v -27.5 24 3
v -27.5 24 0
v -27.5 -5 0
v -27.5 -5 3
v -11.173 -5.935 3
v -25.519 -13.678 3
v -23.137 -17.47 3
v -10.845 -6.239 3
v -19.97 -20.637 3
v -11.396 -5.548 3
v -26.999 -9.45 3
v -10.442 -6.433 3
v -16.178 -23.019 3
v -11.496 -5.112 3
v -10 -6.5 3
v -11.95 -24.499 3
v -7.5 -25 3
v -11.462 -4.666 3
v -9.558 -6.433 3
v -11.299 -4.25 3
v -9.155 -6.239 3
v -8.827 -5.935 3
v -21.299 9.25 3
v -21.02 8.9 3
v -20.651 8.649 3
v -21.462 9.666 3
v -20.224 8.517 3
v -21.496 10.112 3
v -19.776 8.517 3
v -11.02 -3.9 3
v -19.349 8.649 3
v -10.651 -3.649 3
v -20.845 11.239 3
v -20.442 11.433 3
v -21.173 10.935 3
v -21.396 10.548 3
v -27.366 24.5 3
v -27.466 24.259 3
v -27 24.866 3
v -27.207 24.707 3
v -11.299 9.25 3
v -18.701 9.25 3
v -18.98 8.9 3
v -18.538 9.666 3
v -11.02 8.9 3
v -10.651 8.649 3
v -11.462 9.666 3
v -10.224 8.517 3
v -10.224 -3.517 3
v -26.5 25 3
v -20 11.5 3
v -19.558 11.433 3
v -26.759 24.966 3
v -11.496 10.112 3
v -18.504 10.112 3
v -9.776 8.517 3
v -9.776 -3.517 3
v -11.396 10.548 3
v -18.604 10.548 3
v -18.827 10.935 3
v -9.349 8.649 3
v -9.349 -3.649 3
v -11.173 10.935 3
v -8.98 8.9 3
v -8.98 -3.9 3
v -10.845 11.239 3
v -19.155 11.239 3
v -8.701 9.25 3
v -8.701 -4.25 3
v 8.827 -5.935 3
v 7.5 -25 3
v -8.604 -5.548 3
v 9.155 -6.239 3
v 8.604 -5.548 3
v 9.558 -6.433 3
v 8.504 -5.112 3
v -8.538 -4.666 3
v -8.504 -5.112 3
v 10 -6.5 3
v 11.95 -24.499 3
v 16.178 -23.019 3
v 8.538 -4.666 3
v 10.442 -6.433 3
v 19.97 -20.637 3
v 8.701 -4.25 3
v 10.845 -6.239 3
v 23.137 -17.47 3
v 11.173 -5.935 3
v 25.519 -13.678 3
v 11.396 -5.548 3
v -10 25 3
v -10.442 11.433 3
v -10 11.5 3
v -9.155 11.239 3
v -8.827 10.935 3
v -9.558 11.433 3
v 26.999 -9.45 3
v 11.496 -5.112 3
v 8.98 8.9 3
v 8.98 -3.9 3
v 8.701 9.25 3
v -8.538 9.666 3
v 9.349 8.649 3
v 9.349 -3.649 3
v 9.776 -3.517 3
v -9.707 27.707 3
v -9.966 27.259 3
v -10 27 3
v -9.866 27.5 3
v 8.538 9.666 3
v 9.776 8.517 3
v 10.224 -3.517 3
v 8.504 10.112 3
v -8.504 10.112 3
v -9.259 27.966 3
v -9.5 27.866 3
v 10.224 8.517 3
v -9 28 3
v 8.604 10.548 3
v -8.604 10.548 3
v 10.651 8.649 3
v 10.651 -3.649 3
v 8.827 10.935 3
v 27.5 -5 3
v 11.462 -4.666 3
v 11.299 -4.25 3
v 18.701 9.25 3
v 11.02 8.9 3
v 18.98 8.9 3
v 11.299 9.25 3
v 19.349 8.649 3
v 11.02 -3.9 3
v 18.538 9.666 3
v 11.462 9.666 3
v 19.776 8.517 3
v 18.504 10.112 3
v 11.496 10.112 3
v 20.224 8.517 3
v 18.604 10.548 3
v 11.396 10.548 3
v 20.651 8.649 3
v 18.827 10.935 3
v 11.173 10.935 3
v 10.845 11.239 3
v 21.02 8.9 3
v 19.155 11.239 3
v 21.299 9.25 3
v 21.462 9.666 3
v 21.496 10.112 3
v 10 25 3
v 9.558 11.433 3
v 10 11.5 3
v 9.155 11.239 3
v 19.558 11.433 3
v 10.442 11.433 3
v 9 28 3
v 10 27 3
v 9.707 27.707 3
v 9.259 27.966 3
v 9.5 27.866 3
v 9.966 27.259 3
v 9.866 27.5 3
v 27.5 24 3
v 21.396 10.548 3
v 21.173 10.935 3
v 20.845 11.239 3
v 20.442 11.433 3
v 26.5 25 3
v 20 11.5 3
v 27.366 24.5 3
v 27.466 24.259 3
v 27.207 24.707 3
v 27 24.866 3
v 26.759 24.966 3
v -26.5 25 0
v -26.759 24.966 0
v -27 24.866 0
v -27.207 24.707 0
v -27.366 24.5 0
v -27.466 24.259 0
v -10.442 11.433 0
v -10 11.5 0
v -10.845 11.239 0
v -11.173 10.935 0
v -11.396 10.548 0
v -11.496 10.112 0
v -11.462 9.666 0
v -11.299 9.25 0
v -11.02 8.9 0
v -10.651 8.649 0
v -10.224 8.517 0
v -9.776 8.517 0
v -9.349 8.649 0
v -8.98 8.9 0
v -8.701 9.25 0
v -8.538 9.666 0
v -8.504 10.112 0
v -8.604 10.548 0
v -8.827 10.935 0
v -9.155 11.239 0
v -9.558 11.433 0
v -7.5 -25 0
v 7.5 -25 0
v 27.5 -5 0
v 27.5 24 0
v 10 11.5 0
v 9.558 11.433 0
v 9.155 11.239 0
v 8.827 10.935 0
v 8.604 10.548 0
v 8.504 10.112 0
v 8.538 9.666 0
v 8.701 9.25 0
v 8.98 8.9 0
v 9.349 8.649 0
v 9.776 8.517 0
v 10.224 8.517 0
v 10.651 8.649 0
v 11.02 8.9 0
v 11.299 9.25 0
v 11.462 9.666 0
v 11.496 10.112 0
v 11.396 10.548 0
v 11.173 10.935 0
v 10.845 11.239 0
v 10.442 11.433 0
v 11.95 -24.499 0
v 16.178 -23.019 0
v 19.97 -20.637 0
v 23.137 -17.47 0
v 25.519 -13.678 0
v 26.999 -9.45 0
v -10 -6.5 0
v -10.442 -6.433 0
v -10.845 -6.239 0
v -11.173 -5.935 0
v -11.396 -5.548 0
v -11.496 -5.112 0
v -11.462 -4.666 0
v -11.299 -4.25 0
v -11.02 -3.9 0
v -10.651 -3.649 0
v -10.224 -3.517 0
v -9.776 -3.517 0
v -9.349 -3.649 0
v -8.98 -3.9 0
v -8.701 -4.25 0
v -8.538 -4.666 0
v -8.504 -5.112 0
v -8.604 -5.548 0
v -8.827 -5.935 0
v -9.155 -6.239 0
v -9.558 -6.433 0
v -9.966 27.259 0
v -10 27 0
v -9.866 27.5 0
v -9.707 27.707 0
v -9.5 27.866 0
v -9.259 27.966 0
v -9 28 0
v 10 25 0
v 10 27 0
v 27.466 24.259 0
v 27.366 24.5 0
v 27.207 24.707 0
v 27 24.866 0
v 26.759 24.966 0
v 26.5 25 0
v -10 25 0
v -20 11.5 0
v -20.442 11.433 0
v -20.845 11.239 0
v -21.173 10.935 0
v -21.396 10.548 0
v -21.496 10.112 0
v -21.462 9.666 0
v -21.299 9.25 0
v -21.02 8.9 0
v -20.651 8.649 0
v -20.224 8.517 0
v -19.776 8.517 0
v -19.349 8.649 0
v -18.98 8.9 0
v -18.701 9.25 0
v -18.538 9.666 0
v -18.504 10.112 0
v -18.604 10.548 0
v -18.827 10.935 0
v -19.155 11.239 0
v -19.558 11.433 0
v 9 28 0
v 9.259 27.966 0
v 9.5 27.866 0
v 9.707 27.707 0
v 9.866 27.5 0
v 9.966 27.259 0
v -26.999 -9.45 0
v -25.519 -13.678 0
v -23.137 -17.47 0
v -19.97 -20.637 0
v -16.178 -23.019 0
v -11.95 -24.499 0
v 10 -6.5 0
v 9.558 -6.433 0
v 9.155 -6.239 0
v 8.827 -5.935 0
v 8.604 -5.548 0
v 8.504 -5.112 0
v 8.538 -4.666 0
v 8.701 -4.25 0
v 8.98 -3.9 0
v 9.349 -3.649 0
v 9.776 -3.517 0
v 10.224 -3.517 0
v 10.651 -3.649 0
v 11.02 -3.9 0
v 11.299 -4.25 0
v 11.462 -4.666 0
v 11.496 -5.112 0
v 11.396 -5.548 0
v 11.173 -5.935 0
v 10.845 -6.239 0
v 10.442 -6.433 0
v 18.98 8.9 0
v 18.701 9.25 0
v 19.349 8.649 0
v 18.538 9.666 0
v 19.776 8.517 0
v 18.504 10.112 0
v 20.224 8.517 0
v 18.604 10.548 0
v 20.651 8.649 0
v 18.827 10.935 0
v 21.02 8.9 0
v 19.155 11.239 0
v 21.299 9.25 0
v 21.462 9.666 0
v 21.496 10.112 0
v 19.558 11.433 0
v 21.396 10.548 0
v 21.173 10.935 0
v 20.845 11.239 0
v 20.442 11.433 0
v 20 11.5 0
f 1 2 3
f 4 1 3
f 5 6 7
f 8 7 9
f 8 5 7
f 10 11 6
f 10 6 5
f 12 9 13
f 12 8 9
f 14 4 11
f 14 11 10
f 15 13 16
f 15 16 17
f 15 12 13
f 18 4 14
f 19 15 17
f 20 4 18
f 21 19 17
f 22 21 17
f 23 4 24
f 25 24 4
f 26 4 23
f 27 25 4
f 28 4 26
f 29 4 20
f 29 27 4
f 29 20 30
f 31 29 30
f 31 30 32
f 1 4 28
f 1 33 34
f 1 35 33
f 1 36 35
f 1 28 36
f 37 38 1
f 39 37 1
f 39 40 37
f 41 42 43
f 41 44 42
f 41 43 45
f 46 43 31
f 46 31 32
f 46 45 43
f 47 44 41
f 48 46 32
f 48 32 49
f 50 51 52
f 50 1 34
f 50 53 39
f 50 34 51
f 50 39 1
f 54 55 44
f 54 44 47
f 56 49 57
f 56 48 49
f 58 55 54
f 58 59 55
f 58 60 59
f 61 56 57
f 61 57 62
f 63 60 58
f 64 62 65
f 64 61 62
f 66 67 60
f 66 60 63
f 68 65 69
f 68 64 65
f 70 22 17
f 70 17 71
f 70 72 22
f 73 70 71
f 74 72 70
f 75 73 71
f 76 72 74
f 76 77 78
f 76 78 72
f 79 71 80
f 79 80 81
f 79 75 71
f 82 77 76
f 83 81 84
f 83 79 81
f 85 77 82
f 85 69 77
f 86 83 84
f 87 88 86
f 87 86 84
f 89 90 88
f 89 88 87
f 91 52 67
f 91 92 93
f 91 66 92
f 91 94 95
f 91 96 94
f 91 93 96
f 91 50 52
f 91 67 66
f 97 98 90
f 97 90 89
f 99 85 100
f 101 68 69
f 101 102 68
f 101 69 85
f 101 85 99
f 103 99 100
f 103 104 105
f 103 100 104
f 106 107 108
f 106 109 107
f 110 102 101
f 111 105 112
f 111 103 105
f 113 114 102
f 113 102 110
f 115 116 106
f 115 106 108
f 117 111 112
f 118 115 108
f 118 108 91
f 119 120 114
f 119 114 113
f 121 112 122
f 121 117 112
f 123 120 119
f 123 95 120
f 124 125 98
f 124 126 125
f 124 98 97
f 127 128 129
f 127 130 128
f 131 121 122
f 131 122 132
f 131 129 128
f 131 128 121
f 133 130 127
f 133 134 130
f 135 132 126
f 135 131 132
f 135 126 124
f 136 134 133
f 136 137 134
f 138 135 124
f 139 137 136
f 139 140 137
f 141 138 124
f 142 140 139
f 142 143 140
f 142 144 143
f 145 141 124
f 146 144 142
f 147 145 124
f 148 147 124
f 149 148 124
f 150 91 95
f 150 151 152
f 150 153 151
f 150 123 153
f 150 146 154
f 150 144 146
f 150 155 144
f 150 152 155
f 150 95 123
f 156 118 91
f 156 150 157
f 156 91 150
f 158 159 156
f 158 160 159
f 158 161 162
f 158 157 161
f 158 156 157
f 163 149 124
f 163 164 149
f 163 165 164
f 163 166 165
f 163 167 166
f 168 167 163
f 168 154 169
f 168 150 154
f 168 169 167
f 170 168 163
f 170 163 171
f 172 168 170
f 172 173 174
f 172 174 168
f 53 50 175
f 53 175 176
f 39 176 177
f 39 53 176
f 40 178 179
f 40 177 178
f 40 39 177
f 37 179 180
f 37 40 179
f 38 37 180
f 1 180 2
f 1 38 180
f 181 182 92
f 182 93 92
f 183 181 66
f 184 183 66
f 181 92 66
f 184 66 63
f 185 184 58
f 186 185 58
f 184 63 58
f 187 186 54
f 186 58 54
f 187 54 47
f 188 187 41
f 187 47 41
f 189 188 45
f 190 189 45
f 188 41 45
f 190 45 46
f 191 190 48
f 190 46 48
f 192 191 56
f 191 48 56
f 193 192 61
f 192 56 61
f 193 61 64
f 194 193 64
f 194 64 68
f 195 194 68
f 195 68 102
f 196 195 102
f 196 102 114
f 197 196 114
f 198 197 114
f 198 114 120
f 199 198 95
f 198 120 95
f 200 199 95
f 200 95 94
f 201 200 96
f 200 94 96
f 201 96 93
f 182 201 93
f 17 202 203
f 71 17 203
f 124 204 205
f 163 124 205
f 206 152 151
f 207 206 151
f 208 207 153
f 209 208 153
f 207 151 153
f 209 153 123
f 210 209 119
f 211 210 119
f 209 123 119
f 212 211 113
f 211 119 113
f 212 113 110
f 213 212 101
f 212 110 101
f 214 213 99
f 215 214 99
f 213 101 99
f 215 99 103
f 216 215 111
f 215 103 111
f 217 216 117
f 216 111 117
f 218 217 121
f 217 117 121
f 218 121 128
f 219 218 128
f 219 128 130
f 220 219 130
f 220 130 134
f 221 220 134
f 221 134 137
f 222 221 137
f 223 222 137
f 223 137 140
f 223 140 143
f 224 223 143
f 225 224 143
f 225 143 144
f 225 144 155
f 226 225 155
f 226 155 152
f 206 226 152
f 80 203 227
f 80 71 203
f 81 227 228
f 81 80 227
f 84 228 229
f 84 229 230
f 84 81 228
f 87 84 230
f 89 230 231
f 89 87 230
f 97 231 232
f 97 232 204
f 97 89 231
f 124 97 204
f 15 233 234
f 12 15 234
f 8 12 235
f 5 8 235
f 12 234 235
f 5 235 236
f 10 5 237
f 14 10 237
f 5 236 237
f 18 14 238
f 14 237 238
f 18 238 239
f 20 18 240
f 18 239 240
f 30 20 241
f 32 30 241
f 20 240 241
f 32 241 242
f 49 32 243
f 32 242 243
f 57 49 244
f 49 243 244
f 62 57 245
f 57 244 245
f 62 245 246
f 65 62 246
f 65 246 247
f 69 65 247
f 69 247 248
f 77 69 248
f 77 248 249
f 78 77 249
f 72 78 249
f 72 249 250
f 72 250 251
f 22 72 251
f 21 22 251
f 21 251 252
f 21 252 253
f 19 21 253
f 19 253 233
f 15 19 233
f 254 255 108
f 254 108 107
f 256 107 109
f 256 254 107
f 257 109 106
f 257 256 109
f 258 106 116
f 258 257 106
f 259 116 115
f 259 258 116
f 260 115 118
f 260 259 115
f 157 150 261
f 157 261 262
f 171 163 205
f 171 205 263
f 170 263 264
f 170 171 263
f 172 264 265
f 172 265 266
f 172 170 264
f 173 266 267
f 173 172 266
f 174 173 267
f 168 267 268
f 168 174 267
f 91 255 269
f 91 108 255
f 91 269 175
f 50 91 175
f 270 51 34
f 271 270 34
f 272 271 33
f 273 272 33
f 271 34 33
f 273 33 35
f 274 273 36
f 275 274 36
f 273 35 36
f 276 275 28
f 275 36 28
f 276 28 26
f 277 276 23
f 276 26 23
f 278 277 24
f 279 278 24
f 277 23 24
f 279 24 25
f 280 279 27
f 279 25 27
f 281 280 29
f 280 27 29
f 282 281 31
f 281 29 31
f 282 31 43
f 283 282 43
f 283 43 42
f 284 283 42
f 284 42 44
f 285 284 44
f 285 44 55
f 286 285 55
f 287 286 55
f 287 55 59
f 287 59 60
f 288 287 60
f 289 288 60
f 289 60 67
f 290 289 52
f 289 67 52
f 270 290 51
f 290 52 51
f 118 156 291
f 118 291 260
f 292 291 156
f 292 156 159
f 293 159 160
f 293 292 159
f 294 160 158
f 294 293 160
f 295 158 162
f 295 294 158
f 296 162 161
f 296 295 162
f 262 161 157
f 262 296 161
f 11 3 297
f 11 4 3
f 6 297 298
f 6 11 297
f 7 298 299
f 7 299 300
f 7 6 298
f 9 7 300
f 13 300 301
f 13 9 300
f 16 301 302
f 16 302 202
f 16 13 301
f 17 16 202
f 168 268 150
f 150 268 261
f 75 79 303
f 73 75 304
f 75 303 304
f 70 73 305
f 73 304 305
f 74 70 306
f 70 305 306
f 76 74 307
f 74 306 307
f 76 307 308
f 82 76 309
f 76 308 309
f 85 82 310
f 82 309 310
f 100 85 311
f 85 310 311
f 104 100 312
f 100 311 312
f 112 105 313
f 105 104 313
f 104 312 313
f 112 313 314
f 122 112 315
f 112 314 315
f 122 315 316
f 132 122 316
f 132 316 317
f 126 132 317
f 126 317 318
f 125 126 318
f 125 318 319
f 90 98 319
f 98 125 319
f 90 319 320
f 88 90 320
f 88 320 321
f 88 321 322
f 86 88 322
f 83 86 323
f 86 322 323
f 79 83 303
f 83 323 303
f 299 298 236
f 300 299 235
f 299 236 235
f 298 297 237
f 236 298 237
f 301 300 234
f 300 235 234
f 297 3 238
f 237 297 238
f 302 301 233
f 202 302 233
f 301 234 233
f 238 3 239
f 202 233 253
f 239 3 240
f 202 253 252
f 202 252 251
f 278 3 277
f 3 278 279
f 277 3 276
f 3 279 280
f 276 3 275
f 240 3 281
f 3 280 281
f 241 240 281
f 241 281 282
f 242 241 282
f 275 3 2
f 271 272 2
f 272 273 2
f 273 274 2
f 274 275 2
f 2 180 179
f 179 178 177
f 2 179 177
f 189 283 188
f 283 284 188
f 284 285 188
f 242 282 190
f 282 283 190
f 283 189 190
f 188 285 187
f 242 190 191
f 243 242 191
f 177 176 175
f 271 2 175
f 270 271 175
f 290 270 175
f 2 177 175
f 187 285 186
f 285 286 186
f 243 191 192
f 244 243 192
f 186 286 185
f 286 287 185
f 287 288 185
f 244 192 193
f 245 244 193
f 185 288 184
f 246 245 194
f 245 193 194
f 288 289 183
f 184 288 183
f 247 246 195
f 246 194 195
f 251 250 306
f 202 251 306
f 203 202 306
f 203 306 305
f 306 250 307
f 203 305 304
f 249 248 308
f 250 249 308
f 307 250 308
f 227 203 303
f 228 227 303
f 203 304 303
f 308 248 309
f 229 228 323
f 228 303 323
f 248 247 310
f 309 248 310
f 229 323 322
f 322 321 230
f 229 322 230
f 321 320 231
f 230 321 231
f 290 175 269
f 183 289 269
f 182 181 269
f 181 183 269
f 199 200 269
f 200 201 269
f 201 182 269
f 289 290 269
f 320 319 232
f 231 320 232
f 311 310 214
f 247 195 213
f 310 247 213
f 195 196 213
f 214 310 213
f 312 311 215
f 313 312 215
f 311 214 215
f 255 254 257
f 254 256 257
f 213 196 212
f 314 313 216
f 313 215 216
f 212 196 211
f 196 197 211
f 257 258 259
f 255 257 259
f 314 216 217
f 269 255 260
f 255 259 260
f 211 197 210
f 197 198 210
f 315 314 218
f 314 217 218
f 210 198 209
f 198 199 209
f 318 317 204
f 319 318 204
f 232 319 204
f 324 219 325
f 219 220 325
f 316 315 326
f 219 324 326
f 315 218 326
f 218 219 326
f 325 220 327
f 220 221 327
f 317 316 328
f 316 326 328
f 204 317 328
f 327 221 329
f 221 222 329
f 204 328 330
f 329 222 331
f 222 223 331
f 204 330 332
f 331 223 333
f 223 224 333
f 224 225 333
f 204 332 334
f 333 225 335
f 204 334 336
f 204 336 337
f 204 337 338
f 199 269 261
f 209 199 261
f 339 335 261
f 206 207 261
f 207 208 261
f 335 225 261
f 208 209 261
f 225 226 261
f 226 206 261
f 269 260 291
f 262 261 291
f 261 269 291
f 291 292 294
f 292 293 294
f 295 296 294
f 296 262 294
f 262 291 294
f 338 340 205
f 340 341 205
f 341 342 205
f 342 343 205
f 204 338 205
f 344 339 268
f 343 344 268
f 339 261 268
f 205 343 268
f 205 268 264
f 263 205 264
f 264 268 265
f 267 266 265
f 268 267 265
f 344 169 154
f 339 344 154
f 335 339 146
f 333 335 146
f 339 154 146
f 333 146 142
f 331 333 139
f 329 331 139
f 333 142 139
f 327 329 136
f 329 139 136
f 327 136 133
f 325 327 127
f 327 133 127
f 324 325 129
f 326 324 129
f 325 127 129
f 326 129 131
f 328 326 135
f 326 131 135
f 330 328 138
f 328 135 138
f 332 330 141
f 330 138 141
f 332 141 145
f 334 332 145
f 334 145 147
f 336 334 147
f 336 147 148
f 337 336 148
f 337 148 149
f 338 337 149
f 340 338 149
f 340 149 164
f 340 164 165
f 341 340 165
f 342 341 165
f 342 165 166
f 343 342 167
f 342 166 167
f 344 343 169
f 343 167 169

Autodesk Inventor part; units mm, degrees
ref_plane "YZ Plane" through (0, 0, 0) normal (1, 0, 0) x (0, 1, 0)
ref_plane "XZ Plane" through (0, 0, 0) normal (0, 1, 0) x (-1, 0, 0)
ref_plane "XY Plane" through (0, 0, 0) normal (0, 0, 1) x (1, 0, 0)
sketch "Boceto1" plane through (0, 0, 0) normal (0, 0, 1) x (1, 0, 0)
  line L0 (-27.5, -25) -> (27.5, -25)
  line L1 (27.5, -25) -> (27.5, 25)
  line L2 (27.5, 25) -> (-27.5, 25)
  line L3 (-27.5, 25) -> (-27.5, -25)
  line L4 (-27.5, -25) -> (27.5, 25) construction
  line L5 (27.5, -25) -> (-27.5, 25) construction
  point P0 (0, 0)
  dimension "d0" = 55
  dimension "d1" = 50
extrude "Extrusión1" add sketch "Boceto1" along normal blind 3
sketch "Boceto2" plane through (0, 0, 3) normal (0, 0, 1) x (1, 0, 0)
  line L0 (-10, 22) -> (10, 22)
  line L1 (10, 22) -> (10, 28)
  line L2 (10, 28) -> (-10, 28)
  line L3 (-10, 28) -> (-10, 22)
  line L4 (27.5, 25) -> (-27.5, 25) construction
  line L5 (-10, 22) -> (10, 28) construction
  line L6 (10, 22) -> (-10, 28) construction
  point P0 (0, 0)
  point P1 (0, 25)
  dimension "d4" = 20
  dimension "d5" = 6
extrude "Extrusión2" add sketch "Boceto2" against normal up to surface (3 mm away)
fillet "Empalme1" radius 1 4 edges at (-27.5, 25, 1.5) (27.5, 25, 1.5) (10, 28, 1.5) (-10, 28, 1.5)
sketch "Boceto3" plane through (0, 0, 0) normal (0, 0, -1) x (-1, 0, 0)
  circle A0 centre (20, 10) radius 1.6 construction
  circle A1 centre (10, 10) radius 1.6 construction
  circle A2 centre (-10, 10) radius 1.6 construction
  circle A3 centre (-20, 10) radius 1.6 construction
  point P0 (0, 0)
hole "Agujero1" at (20, 10, 0) at (10, 10, 0) at (-10, 10, 0) at (-20, 10, 0) direction (0, 0, 1) diameter 3 end through all
sketch "Boceto4" plane through (0, 0, 3) normal (0, 0, 1) x (1, 0, 0)
  line L0 (-27.5, -25) -> (27.5, -25) construction
  line L1 (-27.5, 24) -> (-27.5, -25) construction
  line L2 (0, -35.6) -> (0, 38.6) construction
  line L3 (-10, 25) -> (-26.5, 25) construction
  point P0 (0, 0)
  point P1 (-10, -5)
  point P2 (-26.5, -25)
  point P3 (26.5, -25)
  point P4 (-27.5, -24)
  dimension "d18" = 10
  dimension "d26" = 30
hole "Agujero2" at (-10, -5, 3) direction (0, 0, -1) diameter 3 end through all
mirror "Simetría1" about plane through (0, 0, 0) normal (1, 0, 0) of "Agujero2"
fillet "Empalme2" radius 20 2 edges at (-27.5, -25, 1.5) (27.5, -25, 1.5)
properties part number "PlacaBaseGarraSTD"
